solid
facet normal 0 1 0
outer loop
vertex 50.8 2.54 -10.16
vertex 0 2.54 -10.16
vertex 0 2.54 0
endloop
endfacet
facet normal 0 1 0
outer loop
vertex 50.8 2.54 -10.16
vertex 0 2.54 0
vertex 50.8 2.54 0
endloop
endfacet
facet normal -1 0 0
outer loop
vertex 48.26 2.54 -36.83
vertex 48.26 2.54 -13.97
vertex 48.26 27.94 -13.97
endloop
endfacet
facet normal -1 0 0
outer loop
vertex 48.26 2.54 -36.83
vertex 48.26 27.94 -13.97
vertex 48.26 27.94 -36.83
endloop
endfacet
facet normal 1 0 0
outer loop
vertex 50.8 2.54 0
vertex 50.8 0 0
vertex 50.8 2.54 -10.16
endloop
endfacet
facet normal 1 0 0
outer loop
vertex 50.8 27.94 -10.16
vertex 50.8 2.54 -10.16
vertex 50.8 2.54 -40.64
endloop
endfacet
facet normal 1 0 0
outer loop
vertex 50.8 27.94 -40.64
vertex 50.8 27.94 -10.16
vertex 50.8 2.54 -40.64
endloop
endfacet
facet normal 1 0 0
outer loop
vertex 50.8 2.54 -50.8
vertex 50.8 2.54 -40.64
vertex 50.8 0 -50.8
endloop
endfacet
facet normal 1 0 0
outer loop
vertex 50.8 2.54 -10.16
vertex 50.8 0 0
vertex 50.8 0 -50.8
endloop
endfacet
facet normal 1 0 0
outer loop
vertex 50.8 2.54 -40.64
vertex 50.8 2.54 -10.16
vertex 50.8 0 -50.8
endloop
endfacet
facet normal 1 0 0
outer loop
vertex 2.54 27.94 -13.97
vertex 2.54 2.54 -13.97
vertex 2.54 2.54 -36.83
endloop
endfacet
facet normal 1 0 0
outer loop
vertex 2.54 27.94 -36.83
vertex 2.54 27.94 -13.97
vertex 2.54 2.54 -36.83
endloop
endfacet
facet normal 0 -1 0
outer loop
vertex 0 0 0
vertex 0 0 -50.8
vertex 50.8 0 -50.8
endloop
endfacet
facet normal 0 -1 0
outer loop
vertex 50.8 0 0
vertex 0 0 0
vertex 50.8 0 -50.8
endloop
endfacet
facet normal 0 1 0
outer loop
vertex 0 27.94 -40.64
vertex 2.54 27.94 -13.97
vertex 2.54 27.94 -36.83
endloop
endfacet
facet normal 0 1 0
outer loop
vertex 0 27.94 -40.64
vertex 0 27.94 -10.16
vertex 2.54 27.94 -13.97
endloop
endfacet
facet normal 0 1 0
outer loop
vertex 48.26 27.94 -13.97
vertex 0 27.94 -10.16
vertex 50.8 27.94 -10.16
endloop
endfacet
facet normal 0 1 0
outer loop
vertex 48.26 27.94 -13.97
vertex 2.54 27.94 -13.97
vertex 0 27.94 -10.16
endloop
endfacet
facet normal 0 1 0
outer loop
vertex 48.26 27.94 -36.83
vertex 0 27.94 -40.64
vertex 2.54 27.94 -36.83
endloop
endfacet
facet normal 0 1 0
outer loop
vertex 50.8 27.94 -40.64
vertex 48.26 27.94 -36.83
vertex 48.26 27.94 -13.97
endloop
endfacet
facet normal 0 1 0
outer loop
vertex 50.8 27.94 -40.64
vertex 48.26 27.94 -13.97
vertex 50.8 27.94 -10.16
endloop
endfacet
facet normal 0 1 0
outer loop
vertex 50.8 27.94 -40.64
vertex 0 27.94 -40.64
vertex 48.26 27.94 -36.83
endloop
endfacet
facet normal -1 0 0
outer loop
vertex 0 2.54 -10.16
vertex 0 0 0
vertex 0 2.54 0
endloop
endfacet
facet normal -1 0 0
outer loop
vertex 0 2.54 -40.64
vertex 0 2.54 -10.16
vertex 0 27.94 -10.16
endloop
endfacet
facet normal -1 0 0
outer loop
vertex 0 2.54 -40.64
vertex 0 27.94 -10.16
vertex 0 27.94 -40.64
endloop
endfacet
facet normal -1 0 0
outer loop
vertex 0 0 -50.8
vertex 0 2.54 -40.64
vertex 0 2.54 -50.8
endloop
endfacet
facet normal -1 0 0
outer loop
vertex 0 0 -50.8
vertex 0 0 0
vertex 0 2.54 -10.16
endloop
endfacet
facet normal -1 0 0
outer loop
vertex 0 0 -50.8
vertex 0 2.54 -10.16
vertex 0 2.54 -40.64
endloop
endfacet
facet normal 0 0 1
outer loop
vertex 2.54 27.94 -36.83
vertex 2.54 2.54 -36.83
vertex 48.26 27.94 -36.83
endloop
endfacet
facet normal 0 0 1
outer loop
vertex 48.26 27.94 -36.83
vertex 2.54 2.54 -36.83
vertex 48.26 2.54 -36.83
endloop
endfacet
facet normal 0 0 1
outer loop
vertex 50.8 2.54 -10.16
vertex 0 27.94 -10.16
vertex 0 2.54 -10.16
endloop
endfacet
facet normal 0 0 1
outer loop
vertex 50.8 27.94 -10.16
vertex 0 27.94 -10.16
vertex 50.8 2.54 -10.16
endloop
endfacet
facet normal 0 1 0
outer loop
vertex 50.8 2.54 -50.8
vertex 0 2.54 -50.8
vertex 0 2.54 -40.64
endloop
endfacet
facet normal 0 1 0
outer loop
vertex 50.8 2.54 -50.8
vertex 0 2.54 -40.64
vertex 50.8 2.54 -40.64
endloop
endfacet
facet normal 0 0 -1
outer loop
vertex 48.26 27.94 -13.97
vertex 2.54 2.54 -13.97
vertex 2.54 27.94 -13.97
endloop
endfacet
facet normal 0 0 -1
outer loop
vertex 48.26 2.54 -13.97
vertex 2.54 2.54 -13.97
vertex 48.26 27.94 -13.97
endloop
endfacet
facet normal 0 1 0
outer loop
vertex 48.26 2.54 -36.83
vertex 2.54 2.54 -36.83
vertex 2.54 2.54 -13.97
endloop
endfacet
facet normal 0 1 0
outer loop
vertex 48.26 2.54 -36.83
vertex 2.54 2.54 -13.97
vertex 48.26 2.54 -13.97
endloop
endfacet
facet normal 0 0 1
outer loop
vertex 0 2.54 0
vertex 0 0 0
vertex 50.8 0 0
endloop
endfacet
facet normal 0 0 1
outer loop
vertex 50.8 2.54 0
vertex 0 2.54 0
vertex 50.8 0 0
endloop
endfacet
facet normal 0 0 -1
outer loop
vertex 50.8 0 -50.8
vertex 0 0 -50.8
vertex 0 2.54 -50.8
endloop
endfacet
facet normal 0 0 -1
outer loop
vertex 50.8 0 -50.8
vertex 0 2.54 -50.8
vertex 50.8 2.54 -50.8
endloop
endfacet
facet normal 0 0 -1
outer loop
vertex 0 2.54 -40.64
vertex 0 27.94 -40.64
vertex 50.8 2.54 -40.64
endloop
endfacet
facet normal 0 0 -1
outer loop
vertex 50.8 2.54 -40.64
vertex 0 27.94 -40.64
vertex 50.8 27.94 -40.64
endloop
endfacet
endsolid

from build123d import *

# Parameters (mm, degrees)
SKETCH1_W           = 50.8
SKETCH1_H           = 50.8
BOSS_EXTRUDE1_DEPTH = 2.54
SKETCH2_W           = 50.8
SKETCH2_H           = 50.8
SKETCH2_W_2         = 45.72
SKETCH2_H_2         = 22.86
BOSS_EXTRUDE2_DEPTH = 25.4
SKETCH3_W           = 50.8
SKETCH3_H           = 10.16
CUT_EXTRUDE1_DEPTH  = 25.4


with BuildPart() as part:
    # Sketch1 → Boss-Extrude1 (new body)
    with BuildSketch(Plane(origin=(0, 0, 0), x_dir=(1, 0, 0), z_dir=(0, 1, 0))):
        with Locations((25.4, 25.4)):
            Rectangle(SKETCH1_W, SKETCH1_H)
    extrude(amount=BOSS_EXTRUDE1_DEPTH)

    # Sketch2 → Boss-Extrude2 (add)
    with BuildSketch(Plane(origin=(0, 2.54, 0), x_dir=(1, 0, 0), z_dir=(0, 1, 0))):
        with Locations((25.4, 25.4)):
            Rectangle(SKETCH2_W, SKETCH2_H)
        with Locations((25.4, 25.4)):
            Rectangle(SKETCH2_W_2, SKETCH2_H_2, mode=Mode.SUBTRACT)
    extrude(amount=BOSS_EXTRUDE2_DEPTH)

    # Sketch3 → Cut-Extrude1 (cut)
    with BuildSketch(Plane(origin=(0, 27.94, 0), x_dir=(1, 0, 0), z_dir=(0, 1, 0))):
        with Locations((25.4, 45.72)):
            Rectangle(SKETCH3_W, SKETCH3_H)
        with Locations((25.4, 5.08)):
            Rectangle(SKETCH3_W, SKETCH3_H)
    extrude(amount=-CUT_EXTRUDE1_DEPTH, mode=Mode.SUBTRACT)


solid = part.part
